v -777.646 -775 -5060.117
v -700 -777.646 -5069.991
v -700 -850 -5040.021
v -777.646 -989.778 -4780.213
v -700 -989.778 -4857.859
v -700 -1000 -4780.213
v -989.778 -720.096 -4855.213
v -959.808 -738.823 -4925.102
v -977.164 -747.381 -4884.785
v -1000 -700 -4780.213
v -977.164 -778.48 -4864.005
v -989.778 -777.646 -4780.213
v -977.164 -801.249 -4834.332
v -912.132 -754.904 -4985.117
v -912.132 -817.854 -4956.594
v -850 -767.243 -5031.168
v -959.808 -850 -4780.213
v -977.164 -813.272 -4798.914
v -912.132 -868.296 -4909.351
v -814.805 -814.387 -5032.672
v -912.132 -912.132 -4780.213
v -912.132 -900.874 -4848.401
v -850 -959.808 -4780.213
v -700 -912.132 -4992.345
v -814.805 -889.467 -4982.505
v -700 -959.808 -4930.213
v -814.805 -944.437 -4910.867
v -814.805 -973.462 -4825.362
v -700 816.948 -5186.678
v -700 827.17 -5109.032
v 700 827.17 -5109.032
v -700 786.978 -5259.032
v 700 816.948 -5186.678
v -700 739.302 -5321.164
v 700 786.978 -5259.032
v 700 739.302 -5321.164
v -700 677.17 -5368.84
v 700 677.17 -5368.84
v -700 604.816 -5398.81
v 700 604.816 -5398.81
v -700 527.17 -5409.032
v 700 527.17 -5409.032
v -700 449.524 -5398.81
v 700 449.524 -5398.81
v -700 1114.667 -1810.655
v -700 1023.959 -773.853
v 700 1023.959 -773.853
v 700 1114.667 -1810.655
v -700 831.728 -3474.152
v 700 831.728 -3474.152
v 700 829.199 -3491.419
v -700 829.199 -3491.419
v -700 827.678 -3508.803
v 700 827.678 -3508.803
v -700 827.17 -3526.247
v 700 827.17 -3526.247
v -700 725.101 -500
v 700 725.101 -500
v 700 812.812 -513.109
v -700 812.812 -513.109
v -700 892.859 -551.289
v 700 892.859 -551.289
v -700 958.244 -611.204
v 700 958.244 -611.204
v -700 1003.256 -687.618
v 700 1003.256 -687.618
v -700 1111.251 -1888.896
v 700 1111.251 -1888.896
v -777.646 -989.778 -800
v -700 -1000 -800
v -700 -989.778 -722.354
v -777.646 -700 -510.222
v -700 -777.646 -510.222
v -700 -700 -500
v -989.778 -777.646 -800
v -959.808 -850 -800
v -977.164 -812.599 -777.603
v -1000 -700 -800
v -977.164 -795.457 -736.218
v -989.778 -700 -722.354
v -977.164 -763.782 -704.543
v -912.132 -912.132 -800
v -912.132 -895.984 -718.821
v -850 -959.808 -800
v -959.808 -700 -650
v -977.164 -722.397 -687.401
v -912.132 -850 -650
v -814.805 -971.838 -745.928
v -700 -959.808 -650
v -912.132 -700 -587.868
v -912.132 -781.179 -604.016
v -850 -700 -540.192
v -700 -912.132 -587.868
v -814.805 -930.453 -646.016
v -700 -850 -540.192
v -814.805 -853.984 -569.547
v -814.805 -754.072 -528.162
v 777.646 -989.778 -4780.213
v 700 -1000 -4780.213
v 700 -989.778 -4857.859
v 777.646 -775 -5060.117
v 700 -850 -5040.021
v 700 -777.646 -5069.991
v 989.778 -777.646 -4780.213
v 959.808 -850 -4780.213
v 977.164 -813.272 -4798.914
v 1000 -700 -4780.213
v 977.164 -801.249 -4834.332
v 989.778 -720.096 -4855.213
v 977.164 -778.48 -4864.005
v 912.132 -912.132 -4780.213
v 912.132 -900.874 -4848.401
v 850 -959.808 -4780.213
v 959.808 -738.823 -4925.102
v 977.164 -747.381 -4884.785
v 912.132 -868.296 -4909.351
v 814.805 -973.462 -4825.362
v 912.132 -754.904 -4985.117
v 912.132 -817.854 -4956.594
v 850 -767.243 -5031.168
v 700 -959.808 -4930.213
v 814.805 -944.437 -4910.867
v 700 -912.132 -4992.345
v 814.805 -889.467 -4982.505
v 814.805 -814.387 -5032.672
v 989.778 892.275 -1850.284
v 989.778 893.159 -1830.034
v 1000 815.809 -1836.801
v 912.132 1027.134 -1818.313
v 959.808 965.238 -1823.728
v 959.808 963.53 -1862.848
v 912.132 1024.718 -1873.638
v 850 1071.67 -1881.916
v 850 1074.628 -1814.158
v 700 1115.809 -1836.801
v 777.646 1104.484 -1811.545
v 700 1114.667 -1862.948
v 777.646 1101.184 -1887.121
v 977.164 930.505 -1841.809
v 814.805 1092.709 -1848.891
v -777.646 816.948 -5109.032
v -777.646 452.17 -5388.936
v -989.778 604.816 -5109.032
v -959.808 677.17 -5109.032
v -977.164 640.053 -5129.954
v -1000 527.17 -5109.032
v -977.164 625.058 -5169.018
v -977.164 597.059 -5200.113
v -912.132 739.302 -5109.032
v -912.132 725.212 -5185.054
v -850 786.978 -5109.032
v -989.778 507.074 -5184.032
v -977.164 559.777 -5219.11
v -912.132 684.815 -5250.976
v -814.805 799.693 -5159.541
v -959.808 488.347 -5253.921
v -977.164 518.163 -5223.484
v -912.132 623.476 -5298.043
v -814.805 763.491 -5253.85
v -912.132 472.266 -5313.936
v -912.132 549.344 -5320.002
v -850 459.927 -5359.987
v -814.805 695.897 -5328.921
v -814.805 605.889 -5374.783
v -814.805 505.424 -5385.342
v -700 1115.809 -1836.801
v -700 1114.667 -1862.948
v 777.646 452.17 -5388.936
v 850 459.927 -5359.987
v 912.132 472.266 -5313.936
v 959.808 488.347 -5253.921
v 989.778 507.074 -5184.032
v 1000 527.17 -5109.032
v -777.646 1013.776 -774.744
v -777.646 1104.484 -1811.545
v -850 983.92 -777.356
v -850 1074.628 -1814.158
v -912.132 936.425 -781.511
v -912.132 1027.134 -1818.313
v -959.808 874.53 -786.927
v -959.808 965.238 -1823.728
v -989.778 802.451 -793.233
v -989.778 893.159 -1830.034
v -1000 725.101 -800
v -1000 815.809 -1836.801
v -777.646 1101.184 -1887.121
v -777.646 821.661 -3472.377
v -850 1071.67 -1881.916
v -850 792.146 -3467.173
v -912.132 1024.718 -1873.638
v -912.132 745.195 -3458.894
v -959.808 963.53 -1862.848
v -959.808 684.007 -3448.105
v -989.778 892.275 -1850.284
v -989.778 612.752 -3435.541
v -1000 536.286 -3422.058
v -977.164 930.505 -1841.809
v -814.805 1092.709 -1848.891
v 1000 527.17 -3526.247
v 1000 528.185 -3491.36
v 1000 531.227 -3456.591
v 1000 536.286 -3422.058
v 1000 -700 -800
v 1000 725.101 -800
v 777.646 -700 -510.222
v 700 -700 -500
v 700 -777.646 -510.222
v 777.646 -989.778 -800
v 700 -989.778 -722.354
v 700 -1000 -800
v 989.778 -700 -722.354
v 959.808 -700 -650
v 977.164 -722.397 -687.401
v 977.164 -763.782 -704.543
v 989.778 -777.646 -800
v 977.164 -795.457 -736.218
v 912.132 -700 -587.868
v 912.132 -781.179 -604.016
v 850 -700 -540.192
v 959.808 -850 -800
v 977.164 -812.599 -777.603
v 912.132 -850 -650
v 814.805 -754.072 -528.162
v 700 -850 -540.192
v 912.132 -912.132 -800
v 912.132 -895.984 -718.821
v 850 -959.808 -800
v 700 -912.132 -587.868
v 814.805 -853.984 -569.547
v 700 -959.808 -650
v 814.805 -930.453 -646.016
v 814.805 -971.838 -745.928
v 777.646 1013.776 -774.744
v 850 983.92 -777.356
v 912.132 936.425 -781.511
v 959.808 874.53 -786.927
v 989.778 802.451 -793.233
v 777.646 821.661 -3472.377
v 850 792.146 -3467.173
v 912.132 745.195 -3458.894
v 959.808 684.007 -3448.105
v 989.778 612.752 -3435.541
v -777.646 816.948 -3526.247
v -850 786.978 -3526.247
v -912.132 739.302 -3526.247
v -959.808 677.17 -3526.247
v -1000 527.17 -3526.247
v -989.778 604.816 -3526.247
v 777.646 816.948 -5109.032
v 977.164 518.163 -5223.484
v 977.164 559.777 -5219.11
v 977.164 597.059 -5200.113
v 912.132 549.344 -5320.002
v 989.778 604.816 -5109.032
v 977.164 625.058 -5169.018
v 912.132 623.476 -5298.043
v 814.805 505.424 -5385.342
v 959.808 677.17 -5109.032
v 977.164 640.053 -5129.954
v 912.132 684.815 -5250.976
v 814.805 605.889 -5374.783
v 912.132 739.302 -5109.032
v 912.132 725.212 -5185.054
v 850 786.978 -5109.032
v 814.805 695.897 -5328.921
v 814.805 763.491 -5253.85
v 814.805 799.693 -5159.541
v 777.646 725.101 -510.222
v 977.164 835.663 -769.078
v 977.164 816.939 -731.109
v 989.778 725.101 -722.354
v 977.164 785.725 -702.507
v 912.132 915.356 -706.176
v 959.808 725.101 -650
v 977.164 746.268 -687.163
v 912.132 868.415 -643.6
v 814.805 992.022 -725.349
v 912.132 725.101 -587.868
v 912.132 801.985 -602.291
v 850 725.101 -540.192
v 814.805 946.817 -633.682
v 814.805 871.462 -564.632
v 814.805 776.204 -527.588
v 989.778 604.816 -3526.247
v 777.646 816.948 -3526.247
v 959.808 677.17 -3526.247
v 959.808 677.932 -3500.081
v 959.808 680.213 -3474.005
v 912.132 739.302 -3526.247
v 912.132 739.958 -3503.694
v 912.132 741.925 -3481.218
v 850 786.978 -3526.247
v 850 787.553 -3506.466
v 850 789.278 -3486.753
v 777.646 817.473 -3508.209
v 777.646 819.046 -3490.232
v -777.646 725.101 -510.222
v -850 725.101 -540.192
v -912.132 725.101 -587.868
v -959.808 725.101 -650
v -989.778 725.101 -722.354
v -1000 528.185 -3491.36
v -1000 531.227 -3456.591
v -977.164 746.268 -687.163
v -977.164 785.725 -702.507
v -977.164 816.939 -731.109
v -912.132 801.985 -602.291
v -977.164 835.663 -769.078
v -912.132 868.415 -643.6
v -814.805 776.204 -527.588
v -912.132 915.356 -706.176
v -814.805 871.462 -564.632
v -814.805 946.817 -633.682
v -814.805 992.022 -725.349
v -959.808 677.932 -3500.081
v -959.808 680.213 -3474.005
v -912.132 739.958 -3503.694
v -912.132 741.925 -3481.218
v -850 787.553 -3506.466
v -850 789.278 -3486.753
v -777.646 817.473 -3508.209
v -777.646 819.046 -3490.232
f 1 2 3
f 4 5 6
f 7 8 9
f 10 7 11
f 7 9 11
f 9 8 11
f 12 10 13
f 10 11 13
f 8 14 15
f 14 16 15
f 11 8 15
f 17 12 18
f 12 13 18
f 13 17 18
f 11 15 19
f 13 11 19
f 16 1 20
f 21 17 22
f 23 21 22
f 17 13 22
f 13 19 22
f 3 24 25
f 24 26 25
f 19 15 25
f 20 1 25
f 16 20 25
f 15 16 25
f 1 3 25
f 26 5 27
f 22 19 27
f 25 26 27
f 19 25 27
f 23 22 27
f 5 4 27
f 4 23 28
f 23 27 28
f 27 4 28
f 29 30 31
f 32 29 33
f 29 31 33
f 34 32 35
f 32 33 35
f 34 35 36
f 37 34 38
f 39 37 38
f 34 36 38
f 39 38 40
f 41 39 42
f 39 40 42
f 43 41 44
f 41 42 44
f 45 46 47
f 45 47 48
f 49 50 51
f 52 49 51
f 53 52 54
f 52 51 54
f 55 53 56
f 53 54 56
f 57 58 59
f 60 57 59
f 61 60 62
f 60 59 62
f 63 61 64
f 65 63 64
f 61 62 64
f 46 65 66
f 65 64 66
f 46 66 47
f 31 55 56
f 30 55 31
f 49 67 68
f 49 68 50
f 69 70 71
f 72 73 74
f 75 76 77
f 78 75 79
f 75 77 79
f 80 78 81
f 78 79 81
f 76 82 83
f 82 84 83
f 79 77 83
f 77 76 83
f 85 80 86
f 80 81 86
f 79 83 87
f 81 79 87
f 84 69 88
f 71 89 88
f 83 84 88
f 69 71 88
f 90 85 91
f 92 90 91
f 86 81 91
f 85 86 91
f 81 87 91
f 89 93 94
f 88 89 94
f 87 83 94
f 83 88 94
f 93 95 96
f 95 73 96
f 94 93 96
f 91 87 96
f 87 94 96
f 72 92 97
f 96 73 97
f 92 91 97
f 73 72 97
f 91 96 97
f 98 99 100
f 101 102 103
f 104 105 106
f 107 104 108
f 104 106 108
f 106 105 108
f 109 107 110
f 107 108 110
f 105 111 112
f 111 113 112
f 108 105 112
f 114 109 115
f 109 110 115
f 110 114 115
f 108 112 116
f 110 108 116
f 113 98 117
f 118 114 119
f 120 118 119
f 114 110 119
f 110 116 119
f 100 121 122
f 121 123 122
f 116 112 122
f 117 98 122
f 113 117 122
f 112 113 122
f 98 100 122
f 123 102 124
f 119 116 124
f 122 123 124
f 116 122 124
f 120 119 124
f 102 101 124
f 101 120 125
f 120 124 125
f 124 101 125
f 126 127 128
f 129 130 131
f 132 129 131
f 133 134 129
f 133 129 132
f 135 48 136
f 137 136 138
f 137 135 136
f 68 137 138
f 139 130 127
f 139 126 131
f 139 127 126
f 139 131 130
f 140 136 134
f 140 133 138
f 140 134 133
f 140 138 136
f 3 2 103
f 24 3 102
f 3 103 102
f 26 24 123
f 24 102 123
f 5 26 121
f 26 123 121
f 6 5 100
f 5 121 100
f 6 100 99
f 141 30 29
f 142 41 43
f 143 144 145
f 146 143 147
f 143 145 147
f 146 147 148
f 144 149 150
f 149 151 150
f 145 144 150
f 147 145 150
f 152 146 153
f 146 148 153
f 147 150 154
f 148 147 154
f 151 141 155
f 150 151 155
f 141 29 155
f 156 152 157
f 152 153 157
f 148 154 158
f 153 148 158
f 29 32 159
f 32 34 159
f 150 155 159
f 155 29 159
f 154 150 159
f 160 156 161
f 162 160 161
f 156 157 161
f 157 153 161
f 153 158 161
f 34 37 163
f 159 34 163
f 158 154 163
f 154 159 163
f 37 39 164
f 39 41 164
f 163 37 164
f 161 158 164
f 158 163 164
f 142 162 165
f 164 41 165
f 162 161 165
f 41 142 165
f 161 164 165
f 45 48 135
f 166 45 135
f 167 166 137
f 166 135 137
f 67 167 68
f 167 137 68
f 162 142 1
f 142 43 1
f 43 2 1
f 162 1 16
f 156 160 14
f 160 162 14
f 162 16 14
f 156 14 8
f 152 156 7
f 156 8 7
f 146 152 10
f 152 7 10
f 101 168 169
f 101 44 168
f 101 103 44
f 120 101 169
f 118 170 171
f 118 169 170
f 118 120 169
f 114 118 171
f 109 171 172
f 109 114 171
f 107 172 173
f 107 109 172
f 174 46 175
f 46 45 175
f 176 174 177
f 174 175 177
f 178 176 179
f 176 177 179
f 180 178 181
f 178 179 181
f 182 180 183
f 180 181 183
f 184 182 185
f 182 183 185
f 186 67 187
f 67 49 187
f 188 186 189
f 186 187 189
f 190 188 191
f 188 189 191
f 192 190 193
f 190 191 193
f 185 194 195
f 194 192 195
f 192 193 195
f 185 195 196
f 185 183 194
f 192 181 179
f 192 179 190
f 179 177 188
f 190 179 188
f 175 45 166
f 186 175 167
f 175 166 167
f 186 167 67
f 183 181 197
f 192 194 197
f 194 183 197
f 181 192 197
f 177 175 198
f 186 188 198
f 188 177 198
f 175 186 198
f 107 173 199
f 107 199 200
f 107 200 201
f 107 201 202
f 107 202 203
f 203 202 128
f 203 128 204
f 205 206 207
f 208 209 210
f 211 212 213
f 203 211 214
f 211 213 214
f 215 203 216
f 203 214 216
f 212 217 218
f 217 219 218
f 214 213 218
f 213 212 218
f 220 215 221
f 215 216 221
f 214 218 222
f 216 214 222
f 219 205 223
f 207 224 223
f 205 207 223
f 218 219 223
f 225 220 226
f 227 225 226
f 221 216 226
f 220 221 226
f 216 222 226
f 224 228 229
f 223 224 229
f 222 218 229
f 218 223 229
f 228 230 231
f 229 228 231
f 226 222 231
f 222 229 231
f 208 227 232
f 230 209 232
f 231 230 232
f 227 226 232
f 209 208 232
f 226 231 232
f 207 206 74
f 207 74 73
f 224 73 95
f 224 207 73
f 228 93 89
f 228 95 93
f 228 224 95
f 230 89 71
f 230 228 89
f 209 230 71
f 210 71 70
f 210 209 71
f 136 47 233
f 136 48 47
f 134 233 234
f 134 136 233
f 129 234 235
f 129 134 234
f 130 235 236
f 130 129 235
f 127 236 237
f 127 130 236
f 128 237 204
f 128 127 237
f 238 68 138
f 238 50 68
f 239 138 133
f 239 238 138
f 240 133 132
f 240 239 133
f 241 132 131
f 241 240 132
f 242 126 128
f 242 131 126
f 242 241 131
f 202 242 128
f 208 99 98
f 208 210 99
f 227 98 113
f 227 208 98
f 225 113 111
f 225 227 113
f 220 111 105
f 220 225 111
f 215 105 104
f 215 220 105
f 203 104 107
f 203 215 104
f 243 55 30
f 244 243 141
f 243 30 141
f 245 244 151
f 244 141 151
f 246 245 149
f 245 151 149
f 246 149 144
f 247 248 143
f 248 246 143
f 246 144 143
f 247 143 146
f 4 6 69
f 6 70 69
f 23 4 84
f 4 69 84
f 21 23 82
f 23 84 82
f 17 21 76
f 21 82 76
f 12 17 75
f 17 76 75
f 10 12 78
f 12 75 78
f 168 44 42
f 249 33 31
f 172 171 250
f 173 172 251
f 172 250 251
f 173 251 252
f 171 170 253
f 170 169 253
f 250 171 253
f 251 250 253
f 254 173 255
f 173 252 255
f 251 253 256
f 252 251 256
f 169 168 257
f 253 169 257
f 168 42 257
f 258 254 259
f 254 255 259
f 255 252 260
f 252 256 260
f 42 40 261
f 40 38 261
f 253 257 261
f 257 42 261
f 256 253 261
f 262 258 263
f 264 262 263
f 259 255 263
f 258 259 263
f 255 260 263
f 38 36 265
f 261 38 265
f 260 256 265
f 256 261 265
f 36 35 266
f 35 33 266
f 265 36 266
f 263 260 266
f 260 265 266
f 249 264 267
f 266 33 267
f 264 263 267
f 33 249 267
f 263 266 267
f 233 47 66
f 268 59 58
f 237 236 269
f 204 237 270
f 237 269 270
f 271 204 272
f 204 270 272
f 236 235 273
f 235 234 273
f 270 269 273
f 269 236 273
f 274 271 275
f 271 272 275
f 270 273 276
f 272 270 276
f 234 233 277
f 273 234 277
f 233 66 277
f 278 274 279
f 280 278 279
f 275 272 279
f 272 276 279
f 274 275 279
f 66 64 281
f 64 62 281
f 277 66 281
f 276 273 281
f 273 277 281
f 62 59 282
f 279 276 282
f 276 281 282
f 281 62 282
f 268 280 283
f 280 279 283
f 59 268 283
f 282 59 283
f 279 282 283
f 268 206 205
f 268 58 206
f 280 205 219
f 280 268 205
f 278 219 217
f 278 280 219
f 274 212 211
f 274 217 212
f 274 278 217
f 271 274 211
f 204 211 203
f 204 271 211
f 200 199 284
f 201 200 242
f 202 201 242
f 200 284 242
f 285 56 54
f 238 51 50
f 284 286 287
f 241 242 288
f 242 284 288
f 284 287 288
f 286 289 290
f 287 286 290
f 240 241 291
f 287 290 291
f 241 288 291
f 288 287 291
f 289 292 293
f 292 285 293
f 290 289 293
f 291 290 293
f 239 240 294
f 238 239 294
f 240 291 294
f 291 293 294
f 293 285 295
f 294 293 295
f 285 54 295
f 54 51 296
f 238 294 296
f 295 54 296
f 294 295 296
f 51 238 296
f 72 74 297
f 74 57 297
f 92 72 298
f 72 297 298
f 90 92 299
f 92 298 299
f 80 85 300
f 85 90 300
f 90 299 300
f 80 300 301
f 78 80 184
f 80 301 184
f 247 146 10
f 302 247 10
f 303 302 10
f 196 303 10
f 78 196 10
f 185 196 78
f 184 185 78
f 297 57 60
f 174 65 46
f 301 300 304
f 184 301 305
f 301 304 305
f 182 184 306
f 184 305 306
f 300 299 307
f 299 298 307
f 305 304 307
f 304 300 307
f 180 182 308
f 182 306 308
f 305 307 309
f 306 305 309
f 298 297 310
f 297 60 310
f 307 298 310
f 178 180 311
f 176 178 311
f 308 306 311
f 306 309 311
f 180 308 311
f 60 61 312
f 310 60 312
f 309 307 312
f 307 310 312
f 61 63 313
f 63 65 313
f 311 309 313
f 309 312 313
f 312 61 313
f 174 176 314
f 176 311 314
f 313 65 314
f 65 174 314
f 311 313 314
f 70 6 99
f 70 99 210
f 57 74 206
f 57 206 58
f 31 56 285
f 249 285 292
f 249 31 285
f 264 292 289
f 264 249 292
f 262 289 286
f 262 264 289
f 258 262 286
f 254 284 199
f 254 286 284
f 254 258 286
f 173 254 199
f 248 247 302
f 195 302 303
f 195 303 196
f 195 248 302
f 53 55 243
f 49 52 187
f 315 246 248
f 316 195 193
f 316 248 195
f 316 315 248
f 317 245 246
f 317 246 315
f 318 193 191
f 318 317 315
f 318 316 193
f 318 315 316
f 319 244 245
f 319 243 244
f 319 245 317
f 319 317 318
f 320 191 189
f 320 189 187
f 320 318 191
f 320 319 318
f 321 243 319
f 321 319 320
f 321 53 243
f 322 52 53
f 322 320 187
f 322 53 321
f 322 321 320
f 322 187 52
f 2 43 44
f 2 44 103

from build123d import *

# Parameters (mm, degrees)
AUFSATZ_LINEAR_AUSTRAGEN1_DEPTH      = 1000
AUFSATZ_LINEAR_AUSTRAGEN1_DEPTH_BACK = 1000
VERRUNDUNG1_R                        = 300


with BuildPart() as part:
    # Skizze2 → Aufsatz-Linear austragen1 (new, two sides: drawn at the far end of the back side and taken through both)
    with BuildSketch(Plane(origin=(0, 0, 0), x_dir=(0, 0, -1), z_dir=(1, 0, 0)).offset(-AUFSATZ_LINEAR_AUSTRAGEN1_DEPTH_BACK)):
        Polygon((500, -1000), (500, 1000), (1850, 1118.10969576), (3500, 827.170177591), (5500, 827.170177591), (5010.41122648, -1000), align=None)
    extrude(amount=AUFSATZ_LINEAR_AUSTRAGEN1_DEPTH + AUFSATZ_LINEAR_AUSTRAGEN1_DEPTH_BACK)

    # Verrundung1
    verrundung1_edges = [part.edges().sort_by_distance(p)[0] for p in [
        (0, 1000, -500),
        (0, -1000, -500),
        (0, -1000, -5010.41122648),
        (0, 827.170177591, -5500),
        (0, 827.170177591, -3500),
        (0, 1118.10969576, -1850),
        (-1000, 827.170177591, -4500),
        (1000, 1059.05484788, -1175),
        (1000, 0, -500),
        (1000, -1000, -2755.20561324),
        (-1000, -86.414911204, -5255.20561324),
        (1000, -86.414911204, -5255.20561324),
        (1000, 827.170177591, -4500),
        (1000, 972.639936676, -2675),
        (-1000, -1000, -2755.20561324),
        (-1000, 0, -500),
        (-1000, 1059.05484788, -1175),
        (-1000, 972.639936676, -2675),
    ]]
    fillet(verrundung1_edges, radius=VERRUNDUNG1_R)


solid = part.part
